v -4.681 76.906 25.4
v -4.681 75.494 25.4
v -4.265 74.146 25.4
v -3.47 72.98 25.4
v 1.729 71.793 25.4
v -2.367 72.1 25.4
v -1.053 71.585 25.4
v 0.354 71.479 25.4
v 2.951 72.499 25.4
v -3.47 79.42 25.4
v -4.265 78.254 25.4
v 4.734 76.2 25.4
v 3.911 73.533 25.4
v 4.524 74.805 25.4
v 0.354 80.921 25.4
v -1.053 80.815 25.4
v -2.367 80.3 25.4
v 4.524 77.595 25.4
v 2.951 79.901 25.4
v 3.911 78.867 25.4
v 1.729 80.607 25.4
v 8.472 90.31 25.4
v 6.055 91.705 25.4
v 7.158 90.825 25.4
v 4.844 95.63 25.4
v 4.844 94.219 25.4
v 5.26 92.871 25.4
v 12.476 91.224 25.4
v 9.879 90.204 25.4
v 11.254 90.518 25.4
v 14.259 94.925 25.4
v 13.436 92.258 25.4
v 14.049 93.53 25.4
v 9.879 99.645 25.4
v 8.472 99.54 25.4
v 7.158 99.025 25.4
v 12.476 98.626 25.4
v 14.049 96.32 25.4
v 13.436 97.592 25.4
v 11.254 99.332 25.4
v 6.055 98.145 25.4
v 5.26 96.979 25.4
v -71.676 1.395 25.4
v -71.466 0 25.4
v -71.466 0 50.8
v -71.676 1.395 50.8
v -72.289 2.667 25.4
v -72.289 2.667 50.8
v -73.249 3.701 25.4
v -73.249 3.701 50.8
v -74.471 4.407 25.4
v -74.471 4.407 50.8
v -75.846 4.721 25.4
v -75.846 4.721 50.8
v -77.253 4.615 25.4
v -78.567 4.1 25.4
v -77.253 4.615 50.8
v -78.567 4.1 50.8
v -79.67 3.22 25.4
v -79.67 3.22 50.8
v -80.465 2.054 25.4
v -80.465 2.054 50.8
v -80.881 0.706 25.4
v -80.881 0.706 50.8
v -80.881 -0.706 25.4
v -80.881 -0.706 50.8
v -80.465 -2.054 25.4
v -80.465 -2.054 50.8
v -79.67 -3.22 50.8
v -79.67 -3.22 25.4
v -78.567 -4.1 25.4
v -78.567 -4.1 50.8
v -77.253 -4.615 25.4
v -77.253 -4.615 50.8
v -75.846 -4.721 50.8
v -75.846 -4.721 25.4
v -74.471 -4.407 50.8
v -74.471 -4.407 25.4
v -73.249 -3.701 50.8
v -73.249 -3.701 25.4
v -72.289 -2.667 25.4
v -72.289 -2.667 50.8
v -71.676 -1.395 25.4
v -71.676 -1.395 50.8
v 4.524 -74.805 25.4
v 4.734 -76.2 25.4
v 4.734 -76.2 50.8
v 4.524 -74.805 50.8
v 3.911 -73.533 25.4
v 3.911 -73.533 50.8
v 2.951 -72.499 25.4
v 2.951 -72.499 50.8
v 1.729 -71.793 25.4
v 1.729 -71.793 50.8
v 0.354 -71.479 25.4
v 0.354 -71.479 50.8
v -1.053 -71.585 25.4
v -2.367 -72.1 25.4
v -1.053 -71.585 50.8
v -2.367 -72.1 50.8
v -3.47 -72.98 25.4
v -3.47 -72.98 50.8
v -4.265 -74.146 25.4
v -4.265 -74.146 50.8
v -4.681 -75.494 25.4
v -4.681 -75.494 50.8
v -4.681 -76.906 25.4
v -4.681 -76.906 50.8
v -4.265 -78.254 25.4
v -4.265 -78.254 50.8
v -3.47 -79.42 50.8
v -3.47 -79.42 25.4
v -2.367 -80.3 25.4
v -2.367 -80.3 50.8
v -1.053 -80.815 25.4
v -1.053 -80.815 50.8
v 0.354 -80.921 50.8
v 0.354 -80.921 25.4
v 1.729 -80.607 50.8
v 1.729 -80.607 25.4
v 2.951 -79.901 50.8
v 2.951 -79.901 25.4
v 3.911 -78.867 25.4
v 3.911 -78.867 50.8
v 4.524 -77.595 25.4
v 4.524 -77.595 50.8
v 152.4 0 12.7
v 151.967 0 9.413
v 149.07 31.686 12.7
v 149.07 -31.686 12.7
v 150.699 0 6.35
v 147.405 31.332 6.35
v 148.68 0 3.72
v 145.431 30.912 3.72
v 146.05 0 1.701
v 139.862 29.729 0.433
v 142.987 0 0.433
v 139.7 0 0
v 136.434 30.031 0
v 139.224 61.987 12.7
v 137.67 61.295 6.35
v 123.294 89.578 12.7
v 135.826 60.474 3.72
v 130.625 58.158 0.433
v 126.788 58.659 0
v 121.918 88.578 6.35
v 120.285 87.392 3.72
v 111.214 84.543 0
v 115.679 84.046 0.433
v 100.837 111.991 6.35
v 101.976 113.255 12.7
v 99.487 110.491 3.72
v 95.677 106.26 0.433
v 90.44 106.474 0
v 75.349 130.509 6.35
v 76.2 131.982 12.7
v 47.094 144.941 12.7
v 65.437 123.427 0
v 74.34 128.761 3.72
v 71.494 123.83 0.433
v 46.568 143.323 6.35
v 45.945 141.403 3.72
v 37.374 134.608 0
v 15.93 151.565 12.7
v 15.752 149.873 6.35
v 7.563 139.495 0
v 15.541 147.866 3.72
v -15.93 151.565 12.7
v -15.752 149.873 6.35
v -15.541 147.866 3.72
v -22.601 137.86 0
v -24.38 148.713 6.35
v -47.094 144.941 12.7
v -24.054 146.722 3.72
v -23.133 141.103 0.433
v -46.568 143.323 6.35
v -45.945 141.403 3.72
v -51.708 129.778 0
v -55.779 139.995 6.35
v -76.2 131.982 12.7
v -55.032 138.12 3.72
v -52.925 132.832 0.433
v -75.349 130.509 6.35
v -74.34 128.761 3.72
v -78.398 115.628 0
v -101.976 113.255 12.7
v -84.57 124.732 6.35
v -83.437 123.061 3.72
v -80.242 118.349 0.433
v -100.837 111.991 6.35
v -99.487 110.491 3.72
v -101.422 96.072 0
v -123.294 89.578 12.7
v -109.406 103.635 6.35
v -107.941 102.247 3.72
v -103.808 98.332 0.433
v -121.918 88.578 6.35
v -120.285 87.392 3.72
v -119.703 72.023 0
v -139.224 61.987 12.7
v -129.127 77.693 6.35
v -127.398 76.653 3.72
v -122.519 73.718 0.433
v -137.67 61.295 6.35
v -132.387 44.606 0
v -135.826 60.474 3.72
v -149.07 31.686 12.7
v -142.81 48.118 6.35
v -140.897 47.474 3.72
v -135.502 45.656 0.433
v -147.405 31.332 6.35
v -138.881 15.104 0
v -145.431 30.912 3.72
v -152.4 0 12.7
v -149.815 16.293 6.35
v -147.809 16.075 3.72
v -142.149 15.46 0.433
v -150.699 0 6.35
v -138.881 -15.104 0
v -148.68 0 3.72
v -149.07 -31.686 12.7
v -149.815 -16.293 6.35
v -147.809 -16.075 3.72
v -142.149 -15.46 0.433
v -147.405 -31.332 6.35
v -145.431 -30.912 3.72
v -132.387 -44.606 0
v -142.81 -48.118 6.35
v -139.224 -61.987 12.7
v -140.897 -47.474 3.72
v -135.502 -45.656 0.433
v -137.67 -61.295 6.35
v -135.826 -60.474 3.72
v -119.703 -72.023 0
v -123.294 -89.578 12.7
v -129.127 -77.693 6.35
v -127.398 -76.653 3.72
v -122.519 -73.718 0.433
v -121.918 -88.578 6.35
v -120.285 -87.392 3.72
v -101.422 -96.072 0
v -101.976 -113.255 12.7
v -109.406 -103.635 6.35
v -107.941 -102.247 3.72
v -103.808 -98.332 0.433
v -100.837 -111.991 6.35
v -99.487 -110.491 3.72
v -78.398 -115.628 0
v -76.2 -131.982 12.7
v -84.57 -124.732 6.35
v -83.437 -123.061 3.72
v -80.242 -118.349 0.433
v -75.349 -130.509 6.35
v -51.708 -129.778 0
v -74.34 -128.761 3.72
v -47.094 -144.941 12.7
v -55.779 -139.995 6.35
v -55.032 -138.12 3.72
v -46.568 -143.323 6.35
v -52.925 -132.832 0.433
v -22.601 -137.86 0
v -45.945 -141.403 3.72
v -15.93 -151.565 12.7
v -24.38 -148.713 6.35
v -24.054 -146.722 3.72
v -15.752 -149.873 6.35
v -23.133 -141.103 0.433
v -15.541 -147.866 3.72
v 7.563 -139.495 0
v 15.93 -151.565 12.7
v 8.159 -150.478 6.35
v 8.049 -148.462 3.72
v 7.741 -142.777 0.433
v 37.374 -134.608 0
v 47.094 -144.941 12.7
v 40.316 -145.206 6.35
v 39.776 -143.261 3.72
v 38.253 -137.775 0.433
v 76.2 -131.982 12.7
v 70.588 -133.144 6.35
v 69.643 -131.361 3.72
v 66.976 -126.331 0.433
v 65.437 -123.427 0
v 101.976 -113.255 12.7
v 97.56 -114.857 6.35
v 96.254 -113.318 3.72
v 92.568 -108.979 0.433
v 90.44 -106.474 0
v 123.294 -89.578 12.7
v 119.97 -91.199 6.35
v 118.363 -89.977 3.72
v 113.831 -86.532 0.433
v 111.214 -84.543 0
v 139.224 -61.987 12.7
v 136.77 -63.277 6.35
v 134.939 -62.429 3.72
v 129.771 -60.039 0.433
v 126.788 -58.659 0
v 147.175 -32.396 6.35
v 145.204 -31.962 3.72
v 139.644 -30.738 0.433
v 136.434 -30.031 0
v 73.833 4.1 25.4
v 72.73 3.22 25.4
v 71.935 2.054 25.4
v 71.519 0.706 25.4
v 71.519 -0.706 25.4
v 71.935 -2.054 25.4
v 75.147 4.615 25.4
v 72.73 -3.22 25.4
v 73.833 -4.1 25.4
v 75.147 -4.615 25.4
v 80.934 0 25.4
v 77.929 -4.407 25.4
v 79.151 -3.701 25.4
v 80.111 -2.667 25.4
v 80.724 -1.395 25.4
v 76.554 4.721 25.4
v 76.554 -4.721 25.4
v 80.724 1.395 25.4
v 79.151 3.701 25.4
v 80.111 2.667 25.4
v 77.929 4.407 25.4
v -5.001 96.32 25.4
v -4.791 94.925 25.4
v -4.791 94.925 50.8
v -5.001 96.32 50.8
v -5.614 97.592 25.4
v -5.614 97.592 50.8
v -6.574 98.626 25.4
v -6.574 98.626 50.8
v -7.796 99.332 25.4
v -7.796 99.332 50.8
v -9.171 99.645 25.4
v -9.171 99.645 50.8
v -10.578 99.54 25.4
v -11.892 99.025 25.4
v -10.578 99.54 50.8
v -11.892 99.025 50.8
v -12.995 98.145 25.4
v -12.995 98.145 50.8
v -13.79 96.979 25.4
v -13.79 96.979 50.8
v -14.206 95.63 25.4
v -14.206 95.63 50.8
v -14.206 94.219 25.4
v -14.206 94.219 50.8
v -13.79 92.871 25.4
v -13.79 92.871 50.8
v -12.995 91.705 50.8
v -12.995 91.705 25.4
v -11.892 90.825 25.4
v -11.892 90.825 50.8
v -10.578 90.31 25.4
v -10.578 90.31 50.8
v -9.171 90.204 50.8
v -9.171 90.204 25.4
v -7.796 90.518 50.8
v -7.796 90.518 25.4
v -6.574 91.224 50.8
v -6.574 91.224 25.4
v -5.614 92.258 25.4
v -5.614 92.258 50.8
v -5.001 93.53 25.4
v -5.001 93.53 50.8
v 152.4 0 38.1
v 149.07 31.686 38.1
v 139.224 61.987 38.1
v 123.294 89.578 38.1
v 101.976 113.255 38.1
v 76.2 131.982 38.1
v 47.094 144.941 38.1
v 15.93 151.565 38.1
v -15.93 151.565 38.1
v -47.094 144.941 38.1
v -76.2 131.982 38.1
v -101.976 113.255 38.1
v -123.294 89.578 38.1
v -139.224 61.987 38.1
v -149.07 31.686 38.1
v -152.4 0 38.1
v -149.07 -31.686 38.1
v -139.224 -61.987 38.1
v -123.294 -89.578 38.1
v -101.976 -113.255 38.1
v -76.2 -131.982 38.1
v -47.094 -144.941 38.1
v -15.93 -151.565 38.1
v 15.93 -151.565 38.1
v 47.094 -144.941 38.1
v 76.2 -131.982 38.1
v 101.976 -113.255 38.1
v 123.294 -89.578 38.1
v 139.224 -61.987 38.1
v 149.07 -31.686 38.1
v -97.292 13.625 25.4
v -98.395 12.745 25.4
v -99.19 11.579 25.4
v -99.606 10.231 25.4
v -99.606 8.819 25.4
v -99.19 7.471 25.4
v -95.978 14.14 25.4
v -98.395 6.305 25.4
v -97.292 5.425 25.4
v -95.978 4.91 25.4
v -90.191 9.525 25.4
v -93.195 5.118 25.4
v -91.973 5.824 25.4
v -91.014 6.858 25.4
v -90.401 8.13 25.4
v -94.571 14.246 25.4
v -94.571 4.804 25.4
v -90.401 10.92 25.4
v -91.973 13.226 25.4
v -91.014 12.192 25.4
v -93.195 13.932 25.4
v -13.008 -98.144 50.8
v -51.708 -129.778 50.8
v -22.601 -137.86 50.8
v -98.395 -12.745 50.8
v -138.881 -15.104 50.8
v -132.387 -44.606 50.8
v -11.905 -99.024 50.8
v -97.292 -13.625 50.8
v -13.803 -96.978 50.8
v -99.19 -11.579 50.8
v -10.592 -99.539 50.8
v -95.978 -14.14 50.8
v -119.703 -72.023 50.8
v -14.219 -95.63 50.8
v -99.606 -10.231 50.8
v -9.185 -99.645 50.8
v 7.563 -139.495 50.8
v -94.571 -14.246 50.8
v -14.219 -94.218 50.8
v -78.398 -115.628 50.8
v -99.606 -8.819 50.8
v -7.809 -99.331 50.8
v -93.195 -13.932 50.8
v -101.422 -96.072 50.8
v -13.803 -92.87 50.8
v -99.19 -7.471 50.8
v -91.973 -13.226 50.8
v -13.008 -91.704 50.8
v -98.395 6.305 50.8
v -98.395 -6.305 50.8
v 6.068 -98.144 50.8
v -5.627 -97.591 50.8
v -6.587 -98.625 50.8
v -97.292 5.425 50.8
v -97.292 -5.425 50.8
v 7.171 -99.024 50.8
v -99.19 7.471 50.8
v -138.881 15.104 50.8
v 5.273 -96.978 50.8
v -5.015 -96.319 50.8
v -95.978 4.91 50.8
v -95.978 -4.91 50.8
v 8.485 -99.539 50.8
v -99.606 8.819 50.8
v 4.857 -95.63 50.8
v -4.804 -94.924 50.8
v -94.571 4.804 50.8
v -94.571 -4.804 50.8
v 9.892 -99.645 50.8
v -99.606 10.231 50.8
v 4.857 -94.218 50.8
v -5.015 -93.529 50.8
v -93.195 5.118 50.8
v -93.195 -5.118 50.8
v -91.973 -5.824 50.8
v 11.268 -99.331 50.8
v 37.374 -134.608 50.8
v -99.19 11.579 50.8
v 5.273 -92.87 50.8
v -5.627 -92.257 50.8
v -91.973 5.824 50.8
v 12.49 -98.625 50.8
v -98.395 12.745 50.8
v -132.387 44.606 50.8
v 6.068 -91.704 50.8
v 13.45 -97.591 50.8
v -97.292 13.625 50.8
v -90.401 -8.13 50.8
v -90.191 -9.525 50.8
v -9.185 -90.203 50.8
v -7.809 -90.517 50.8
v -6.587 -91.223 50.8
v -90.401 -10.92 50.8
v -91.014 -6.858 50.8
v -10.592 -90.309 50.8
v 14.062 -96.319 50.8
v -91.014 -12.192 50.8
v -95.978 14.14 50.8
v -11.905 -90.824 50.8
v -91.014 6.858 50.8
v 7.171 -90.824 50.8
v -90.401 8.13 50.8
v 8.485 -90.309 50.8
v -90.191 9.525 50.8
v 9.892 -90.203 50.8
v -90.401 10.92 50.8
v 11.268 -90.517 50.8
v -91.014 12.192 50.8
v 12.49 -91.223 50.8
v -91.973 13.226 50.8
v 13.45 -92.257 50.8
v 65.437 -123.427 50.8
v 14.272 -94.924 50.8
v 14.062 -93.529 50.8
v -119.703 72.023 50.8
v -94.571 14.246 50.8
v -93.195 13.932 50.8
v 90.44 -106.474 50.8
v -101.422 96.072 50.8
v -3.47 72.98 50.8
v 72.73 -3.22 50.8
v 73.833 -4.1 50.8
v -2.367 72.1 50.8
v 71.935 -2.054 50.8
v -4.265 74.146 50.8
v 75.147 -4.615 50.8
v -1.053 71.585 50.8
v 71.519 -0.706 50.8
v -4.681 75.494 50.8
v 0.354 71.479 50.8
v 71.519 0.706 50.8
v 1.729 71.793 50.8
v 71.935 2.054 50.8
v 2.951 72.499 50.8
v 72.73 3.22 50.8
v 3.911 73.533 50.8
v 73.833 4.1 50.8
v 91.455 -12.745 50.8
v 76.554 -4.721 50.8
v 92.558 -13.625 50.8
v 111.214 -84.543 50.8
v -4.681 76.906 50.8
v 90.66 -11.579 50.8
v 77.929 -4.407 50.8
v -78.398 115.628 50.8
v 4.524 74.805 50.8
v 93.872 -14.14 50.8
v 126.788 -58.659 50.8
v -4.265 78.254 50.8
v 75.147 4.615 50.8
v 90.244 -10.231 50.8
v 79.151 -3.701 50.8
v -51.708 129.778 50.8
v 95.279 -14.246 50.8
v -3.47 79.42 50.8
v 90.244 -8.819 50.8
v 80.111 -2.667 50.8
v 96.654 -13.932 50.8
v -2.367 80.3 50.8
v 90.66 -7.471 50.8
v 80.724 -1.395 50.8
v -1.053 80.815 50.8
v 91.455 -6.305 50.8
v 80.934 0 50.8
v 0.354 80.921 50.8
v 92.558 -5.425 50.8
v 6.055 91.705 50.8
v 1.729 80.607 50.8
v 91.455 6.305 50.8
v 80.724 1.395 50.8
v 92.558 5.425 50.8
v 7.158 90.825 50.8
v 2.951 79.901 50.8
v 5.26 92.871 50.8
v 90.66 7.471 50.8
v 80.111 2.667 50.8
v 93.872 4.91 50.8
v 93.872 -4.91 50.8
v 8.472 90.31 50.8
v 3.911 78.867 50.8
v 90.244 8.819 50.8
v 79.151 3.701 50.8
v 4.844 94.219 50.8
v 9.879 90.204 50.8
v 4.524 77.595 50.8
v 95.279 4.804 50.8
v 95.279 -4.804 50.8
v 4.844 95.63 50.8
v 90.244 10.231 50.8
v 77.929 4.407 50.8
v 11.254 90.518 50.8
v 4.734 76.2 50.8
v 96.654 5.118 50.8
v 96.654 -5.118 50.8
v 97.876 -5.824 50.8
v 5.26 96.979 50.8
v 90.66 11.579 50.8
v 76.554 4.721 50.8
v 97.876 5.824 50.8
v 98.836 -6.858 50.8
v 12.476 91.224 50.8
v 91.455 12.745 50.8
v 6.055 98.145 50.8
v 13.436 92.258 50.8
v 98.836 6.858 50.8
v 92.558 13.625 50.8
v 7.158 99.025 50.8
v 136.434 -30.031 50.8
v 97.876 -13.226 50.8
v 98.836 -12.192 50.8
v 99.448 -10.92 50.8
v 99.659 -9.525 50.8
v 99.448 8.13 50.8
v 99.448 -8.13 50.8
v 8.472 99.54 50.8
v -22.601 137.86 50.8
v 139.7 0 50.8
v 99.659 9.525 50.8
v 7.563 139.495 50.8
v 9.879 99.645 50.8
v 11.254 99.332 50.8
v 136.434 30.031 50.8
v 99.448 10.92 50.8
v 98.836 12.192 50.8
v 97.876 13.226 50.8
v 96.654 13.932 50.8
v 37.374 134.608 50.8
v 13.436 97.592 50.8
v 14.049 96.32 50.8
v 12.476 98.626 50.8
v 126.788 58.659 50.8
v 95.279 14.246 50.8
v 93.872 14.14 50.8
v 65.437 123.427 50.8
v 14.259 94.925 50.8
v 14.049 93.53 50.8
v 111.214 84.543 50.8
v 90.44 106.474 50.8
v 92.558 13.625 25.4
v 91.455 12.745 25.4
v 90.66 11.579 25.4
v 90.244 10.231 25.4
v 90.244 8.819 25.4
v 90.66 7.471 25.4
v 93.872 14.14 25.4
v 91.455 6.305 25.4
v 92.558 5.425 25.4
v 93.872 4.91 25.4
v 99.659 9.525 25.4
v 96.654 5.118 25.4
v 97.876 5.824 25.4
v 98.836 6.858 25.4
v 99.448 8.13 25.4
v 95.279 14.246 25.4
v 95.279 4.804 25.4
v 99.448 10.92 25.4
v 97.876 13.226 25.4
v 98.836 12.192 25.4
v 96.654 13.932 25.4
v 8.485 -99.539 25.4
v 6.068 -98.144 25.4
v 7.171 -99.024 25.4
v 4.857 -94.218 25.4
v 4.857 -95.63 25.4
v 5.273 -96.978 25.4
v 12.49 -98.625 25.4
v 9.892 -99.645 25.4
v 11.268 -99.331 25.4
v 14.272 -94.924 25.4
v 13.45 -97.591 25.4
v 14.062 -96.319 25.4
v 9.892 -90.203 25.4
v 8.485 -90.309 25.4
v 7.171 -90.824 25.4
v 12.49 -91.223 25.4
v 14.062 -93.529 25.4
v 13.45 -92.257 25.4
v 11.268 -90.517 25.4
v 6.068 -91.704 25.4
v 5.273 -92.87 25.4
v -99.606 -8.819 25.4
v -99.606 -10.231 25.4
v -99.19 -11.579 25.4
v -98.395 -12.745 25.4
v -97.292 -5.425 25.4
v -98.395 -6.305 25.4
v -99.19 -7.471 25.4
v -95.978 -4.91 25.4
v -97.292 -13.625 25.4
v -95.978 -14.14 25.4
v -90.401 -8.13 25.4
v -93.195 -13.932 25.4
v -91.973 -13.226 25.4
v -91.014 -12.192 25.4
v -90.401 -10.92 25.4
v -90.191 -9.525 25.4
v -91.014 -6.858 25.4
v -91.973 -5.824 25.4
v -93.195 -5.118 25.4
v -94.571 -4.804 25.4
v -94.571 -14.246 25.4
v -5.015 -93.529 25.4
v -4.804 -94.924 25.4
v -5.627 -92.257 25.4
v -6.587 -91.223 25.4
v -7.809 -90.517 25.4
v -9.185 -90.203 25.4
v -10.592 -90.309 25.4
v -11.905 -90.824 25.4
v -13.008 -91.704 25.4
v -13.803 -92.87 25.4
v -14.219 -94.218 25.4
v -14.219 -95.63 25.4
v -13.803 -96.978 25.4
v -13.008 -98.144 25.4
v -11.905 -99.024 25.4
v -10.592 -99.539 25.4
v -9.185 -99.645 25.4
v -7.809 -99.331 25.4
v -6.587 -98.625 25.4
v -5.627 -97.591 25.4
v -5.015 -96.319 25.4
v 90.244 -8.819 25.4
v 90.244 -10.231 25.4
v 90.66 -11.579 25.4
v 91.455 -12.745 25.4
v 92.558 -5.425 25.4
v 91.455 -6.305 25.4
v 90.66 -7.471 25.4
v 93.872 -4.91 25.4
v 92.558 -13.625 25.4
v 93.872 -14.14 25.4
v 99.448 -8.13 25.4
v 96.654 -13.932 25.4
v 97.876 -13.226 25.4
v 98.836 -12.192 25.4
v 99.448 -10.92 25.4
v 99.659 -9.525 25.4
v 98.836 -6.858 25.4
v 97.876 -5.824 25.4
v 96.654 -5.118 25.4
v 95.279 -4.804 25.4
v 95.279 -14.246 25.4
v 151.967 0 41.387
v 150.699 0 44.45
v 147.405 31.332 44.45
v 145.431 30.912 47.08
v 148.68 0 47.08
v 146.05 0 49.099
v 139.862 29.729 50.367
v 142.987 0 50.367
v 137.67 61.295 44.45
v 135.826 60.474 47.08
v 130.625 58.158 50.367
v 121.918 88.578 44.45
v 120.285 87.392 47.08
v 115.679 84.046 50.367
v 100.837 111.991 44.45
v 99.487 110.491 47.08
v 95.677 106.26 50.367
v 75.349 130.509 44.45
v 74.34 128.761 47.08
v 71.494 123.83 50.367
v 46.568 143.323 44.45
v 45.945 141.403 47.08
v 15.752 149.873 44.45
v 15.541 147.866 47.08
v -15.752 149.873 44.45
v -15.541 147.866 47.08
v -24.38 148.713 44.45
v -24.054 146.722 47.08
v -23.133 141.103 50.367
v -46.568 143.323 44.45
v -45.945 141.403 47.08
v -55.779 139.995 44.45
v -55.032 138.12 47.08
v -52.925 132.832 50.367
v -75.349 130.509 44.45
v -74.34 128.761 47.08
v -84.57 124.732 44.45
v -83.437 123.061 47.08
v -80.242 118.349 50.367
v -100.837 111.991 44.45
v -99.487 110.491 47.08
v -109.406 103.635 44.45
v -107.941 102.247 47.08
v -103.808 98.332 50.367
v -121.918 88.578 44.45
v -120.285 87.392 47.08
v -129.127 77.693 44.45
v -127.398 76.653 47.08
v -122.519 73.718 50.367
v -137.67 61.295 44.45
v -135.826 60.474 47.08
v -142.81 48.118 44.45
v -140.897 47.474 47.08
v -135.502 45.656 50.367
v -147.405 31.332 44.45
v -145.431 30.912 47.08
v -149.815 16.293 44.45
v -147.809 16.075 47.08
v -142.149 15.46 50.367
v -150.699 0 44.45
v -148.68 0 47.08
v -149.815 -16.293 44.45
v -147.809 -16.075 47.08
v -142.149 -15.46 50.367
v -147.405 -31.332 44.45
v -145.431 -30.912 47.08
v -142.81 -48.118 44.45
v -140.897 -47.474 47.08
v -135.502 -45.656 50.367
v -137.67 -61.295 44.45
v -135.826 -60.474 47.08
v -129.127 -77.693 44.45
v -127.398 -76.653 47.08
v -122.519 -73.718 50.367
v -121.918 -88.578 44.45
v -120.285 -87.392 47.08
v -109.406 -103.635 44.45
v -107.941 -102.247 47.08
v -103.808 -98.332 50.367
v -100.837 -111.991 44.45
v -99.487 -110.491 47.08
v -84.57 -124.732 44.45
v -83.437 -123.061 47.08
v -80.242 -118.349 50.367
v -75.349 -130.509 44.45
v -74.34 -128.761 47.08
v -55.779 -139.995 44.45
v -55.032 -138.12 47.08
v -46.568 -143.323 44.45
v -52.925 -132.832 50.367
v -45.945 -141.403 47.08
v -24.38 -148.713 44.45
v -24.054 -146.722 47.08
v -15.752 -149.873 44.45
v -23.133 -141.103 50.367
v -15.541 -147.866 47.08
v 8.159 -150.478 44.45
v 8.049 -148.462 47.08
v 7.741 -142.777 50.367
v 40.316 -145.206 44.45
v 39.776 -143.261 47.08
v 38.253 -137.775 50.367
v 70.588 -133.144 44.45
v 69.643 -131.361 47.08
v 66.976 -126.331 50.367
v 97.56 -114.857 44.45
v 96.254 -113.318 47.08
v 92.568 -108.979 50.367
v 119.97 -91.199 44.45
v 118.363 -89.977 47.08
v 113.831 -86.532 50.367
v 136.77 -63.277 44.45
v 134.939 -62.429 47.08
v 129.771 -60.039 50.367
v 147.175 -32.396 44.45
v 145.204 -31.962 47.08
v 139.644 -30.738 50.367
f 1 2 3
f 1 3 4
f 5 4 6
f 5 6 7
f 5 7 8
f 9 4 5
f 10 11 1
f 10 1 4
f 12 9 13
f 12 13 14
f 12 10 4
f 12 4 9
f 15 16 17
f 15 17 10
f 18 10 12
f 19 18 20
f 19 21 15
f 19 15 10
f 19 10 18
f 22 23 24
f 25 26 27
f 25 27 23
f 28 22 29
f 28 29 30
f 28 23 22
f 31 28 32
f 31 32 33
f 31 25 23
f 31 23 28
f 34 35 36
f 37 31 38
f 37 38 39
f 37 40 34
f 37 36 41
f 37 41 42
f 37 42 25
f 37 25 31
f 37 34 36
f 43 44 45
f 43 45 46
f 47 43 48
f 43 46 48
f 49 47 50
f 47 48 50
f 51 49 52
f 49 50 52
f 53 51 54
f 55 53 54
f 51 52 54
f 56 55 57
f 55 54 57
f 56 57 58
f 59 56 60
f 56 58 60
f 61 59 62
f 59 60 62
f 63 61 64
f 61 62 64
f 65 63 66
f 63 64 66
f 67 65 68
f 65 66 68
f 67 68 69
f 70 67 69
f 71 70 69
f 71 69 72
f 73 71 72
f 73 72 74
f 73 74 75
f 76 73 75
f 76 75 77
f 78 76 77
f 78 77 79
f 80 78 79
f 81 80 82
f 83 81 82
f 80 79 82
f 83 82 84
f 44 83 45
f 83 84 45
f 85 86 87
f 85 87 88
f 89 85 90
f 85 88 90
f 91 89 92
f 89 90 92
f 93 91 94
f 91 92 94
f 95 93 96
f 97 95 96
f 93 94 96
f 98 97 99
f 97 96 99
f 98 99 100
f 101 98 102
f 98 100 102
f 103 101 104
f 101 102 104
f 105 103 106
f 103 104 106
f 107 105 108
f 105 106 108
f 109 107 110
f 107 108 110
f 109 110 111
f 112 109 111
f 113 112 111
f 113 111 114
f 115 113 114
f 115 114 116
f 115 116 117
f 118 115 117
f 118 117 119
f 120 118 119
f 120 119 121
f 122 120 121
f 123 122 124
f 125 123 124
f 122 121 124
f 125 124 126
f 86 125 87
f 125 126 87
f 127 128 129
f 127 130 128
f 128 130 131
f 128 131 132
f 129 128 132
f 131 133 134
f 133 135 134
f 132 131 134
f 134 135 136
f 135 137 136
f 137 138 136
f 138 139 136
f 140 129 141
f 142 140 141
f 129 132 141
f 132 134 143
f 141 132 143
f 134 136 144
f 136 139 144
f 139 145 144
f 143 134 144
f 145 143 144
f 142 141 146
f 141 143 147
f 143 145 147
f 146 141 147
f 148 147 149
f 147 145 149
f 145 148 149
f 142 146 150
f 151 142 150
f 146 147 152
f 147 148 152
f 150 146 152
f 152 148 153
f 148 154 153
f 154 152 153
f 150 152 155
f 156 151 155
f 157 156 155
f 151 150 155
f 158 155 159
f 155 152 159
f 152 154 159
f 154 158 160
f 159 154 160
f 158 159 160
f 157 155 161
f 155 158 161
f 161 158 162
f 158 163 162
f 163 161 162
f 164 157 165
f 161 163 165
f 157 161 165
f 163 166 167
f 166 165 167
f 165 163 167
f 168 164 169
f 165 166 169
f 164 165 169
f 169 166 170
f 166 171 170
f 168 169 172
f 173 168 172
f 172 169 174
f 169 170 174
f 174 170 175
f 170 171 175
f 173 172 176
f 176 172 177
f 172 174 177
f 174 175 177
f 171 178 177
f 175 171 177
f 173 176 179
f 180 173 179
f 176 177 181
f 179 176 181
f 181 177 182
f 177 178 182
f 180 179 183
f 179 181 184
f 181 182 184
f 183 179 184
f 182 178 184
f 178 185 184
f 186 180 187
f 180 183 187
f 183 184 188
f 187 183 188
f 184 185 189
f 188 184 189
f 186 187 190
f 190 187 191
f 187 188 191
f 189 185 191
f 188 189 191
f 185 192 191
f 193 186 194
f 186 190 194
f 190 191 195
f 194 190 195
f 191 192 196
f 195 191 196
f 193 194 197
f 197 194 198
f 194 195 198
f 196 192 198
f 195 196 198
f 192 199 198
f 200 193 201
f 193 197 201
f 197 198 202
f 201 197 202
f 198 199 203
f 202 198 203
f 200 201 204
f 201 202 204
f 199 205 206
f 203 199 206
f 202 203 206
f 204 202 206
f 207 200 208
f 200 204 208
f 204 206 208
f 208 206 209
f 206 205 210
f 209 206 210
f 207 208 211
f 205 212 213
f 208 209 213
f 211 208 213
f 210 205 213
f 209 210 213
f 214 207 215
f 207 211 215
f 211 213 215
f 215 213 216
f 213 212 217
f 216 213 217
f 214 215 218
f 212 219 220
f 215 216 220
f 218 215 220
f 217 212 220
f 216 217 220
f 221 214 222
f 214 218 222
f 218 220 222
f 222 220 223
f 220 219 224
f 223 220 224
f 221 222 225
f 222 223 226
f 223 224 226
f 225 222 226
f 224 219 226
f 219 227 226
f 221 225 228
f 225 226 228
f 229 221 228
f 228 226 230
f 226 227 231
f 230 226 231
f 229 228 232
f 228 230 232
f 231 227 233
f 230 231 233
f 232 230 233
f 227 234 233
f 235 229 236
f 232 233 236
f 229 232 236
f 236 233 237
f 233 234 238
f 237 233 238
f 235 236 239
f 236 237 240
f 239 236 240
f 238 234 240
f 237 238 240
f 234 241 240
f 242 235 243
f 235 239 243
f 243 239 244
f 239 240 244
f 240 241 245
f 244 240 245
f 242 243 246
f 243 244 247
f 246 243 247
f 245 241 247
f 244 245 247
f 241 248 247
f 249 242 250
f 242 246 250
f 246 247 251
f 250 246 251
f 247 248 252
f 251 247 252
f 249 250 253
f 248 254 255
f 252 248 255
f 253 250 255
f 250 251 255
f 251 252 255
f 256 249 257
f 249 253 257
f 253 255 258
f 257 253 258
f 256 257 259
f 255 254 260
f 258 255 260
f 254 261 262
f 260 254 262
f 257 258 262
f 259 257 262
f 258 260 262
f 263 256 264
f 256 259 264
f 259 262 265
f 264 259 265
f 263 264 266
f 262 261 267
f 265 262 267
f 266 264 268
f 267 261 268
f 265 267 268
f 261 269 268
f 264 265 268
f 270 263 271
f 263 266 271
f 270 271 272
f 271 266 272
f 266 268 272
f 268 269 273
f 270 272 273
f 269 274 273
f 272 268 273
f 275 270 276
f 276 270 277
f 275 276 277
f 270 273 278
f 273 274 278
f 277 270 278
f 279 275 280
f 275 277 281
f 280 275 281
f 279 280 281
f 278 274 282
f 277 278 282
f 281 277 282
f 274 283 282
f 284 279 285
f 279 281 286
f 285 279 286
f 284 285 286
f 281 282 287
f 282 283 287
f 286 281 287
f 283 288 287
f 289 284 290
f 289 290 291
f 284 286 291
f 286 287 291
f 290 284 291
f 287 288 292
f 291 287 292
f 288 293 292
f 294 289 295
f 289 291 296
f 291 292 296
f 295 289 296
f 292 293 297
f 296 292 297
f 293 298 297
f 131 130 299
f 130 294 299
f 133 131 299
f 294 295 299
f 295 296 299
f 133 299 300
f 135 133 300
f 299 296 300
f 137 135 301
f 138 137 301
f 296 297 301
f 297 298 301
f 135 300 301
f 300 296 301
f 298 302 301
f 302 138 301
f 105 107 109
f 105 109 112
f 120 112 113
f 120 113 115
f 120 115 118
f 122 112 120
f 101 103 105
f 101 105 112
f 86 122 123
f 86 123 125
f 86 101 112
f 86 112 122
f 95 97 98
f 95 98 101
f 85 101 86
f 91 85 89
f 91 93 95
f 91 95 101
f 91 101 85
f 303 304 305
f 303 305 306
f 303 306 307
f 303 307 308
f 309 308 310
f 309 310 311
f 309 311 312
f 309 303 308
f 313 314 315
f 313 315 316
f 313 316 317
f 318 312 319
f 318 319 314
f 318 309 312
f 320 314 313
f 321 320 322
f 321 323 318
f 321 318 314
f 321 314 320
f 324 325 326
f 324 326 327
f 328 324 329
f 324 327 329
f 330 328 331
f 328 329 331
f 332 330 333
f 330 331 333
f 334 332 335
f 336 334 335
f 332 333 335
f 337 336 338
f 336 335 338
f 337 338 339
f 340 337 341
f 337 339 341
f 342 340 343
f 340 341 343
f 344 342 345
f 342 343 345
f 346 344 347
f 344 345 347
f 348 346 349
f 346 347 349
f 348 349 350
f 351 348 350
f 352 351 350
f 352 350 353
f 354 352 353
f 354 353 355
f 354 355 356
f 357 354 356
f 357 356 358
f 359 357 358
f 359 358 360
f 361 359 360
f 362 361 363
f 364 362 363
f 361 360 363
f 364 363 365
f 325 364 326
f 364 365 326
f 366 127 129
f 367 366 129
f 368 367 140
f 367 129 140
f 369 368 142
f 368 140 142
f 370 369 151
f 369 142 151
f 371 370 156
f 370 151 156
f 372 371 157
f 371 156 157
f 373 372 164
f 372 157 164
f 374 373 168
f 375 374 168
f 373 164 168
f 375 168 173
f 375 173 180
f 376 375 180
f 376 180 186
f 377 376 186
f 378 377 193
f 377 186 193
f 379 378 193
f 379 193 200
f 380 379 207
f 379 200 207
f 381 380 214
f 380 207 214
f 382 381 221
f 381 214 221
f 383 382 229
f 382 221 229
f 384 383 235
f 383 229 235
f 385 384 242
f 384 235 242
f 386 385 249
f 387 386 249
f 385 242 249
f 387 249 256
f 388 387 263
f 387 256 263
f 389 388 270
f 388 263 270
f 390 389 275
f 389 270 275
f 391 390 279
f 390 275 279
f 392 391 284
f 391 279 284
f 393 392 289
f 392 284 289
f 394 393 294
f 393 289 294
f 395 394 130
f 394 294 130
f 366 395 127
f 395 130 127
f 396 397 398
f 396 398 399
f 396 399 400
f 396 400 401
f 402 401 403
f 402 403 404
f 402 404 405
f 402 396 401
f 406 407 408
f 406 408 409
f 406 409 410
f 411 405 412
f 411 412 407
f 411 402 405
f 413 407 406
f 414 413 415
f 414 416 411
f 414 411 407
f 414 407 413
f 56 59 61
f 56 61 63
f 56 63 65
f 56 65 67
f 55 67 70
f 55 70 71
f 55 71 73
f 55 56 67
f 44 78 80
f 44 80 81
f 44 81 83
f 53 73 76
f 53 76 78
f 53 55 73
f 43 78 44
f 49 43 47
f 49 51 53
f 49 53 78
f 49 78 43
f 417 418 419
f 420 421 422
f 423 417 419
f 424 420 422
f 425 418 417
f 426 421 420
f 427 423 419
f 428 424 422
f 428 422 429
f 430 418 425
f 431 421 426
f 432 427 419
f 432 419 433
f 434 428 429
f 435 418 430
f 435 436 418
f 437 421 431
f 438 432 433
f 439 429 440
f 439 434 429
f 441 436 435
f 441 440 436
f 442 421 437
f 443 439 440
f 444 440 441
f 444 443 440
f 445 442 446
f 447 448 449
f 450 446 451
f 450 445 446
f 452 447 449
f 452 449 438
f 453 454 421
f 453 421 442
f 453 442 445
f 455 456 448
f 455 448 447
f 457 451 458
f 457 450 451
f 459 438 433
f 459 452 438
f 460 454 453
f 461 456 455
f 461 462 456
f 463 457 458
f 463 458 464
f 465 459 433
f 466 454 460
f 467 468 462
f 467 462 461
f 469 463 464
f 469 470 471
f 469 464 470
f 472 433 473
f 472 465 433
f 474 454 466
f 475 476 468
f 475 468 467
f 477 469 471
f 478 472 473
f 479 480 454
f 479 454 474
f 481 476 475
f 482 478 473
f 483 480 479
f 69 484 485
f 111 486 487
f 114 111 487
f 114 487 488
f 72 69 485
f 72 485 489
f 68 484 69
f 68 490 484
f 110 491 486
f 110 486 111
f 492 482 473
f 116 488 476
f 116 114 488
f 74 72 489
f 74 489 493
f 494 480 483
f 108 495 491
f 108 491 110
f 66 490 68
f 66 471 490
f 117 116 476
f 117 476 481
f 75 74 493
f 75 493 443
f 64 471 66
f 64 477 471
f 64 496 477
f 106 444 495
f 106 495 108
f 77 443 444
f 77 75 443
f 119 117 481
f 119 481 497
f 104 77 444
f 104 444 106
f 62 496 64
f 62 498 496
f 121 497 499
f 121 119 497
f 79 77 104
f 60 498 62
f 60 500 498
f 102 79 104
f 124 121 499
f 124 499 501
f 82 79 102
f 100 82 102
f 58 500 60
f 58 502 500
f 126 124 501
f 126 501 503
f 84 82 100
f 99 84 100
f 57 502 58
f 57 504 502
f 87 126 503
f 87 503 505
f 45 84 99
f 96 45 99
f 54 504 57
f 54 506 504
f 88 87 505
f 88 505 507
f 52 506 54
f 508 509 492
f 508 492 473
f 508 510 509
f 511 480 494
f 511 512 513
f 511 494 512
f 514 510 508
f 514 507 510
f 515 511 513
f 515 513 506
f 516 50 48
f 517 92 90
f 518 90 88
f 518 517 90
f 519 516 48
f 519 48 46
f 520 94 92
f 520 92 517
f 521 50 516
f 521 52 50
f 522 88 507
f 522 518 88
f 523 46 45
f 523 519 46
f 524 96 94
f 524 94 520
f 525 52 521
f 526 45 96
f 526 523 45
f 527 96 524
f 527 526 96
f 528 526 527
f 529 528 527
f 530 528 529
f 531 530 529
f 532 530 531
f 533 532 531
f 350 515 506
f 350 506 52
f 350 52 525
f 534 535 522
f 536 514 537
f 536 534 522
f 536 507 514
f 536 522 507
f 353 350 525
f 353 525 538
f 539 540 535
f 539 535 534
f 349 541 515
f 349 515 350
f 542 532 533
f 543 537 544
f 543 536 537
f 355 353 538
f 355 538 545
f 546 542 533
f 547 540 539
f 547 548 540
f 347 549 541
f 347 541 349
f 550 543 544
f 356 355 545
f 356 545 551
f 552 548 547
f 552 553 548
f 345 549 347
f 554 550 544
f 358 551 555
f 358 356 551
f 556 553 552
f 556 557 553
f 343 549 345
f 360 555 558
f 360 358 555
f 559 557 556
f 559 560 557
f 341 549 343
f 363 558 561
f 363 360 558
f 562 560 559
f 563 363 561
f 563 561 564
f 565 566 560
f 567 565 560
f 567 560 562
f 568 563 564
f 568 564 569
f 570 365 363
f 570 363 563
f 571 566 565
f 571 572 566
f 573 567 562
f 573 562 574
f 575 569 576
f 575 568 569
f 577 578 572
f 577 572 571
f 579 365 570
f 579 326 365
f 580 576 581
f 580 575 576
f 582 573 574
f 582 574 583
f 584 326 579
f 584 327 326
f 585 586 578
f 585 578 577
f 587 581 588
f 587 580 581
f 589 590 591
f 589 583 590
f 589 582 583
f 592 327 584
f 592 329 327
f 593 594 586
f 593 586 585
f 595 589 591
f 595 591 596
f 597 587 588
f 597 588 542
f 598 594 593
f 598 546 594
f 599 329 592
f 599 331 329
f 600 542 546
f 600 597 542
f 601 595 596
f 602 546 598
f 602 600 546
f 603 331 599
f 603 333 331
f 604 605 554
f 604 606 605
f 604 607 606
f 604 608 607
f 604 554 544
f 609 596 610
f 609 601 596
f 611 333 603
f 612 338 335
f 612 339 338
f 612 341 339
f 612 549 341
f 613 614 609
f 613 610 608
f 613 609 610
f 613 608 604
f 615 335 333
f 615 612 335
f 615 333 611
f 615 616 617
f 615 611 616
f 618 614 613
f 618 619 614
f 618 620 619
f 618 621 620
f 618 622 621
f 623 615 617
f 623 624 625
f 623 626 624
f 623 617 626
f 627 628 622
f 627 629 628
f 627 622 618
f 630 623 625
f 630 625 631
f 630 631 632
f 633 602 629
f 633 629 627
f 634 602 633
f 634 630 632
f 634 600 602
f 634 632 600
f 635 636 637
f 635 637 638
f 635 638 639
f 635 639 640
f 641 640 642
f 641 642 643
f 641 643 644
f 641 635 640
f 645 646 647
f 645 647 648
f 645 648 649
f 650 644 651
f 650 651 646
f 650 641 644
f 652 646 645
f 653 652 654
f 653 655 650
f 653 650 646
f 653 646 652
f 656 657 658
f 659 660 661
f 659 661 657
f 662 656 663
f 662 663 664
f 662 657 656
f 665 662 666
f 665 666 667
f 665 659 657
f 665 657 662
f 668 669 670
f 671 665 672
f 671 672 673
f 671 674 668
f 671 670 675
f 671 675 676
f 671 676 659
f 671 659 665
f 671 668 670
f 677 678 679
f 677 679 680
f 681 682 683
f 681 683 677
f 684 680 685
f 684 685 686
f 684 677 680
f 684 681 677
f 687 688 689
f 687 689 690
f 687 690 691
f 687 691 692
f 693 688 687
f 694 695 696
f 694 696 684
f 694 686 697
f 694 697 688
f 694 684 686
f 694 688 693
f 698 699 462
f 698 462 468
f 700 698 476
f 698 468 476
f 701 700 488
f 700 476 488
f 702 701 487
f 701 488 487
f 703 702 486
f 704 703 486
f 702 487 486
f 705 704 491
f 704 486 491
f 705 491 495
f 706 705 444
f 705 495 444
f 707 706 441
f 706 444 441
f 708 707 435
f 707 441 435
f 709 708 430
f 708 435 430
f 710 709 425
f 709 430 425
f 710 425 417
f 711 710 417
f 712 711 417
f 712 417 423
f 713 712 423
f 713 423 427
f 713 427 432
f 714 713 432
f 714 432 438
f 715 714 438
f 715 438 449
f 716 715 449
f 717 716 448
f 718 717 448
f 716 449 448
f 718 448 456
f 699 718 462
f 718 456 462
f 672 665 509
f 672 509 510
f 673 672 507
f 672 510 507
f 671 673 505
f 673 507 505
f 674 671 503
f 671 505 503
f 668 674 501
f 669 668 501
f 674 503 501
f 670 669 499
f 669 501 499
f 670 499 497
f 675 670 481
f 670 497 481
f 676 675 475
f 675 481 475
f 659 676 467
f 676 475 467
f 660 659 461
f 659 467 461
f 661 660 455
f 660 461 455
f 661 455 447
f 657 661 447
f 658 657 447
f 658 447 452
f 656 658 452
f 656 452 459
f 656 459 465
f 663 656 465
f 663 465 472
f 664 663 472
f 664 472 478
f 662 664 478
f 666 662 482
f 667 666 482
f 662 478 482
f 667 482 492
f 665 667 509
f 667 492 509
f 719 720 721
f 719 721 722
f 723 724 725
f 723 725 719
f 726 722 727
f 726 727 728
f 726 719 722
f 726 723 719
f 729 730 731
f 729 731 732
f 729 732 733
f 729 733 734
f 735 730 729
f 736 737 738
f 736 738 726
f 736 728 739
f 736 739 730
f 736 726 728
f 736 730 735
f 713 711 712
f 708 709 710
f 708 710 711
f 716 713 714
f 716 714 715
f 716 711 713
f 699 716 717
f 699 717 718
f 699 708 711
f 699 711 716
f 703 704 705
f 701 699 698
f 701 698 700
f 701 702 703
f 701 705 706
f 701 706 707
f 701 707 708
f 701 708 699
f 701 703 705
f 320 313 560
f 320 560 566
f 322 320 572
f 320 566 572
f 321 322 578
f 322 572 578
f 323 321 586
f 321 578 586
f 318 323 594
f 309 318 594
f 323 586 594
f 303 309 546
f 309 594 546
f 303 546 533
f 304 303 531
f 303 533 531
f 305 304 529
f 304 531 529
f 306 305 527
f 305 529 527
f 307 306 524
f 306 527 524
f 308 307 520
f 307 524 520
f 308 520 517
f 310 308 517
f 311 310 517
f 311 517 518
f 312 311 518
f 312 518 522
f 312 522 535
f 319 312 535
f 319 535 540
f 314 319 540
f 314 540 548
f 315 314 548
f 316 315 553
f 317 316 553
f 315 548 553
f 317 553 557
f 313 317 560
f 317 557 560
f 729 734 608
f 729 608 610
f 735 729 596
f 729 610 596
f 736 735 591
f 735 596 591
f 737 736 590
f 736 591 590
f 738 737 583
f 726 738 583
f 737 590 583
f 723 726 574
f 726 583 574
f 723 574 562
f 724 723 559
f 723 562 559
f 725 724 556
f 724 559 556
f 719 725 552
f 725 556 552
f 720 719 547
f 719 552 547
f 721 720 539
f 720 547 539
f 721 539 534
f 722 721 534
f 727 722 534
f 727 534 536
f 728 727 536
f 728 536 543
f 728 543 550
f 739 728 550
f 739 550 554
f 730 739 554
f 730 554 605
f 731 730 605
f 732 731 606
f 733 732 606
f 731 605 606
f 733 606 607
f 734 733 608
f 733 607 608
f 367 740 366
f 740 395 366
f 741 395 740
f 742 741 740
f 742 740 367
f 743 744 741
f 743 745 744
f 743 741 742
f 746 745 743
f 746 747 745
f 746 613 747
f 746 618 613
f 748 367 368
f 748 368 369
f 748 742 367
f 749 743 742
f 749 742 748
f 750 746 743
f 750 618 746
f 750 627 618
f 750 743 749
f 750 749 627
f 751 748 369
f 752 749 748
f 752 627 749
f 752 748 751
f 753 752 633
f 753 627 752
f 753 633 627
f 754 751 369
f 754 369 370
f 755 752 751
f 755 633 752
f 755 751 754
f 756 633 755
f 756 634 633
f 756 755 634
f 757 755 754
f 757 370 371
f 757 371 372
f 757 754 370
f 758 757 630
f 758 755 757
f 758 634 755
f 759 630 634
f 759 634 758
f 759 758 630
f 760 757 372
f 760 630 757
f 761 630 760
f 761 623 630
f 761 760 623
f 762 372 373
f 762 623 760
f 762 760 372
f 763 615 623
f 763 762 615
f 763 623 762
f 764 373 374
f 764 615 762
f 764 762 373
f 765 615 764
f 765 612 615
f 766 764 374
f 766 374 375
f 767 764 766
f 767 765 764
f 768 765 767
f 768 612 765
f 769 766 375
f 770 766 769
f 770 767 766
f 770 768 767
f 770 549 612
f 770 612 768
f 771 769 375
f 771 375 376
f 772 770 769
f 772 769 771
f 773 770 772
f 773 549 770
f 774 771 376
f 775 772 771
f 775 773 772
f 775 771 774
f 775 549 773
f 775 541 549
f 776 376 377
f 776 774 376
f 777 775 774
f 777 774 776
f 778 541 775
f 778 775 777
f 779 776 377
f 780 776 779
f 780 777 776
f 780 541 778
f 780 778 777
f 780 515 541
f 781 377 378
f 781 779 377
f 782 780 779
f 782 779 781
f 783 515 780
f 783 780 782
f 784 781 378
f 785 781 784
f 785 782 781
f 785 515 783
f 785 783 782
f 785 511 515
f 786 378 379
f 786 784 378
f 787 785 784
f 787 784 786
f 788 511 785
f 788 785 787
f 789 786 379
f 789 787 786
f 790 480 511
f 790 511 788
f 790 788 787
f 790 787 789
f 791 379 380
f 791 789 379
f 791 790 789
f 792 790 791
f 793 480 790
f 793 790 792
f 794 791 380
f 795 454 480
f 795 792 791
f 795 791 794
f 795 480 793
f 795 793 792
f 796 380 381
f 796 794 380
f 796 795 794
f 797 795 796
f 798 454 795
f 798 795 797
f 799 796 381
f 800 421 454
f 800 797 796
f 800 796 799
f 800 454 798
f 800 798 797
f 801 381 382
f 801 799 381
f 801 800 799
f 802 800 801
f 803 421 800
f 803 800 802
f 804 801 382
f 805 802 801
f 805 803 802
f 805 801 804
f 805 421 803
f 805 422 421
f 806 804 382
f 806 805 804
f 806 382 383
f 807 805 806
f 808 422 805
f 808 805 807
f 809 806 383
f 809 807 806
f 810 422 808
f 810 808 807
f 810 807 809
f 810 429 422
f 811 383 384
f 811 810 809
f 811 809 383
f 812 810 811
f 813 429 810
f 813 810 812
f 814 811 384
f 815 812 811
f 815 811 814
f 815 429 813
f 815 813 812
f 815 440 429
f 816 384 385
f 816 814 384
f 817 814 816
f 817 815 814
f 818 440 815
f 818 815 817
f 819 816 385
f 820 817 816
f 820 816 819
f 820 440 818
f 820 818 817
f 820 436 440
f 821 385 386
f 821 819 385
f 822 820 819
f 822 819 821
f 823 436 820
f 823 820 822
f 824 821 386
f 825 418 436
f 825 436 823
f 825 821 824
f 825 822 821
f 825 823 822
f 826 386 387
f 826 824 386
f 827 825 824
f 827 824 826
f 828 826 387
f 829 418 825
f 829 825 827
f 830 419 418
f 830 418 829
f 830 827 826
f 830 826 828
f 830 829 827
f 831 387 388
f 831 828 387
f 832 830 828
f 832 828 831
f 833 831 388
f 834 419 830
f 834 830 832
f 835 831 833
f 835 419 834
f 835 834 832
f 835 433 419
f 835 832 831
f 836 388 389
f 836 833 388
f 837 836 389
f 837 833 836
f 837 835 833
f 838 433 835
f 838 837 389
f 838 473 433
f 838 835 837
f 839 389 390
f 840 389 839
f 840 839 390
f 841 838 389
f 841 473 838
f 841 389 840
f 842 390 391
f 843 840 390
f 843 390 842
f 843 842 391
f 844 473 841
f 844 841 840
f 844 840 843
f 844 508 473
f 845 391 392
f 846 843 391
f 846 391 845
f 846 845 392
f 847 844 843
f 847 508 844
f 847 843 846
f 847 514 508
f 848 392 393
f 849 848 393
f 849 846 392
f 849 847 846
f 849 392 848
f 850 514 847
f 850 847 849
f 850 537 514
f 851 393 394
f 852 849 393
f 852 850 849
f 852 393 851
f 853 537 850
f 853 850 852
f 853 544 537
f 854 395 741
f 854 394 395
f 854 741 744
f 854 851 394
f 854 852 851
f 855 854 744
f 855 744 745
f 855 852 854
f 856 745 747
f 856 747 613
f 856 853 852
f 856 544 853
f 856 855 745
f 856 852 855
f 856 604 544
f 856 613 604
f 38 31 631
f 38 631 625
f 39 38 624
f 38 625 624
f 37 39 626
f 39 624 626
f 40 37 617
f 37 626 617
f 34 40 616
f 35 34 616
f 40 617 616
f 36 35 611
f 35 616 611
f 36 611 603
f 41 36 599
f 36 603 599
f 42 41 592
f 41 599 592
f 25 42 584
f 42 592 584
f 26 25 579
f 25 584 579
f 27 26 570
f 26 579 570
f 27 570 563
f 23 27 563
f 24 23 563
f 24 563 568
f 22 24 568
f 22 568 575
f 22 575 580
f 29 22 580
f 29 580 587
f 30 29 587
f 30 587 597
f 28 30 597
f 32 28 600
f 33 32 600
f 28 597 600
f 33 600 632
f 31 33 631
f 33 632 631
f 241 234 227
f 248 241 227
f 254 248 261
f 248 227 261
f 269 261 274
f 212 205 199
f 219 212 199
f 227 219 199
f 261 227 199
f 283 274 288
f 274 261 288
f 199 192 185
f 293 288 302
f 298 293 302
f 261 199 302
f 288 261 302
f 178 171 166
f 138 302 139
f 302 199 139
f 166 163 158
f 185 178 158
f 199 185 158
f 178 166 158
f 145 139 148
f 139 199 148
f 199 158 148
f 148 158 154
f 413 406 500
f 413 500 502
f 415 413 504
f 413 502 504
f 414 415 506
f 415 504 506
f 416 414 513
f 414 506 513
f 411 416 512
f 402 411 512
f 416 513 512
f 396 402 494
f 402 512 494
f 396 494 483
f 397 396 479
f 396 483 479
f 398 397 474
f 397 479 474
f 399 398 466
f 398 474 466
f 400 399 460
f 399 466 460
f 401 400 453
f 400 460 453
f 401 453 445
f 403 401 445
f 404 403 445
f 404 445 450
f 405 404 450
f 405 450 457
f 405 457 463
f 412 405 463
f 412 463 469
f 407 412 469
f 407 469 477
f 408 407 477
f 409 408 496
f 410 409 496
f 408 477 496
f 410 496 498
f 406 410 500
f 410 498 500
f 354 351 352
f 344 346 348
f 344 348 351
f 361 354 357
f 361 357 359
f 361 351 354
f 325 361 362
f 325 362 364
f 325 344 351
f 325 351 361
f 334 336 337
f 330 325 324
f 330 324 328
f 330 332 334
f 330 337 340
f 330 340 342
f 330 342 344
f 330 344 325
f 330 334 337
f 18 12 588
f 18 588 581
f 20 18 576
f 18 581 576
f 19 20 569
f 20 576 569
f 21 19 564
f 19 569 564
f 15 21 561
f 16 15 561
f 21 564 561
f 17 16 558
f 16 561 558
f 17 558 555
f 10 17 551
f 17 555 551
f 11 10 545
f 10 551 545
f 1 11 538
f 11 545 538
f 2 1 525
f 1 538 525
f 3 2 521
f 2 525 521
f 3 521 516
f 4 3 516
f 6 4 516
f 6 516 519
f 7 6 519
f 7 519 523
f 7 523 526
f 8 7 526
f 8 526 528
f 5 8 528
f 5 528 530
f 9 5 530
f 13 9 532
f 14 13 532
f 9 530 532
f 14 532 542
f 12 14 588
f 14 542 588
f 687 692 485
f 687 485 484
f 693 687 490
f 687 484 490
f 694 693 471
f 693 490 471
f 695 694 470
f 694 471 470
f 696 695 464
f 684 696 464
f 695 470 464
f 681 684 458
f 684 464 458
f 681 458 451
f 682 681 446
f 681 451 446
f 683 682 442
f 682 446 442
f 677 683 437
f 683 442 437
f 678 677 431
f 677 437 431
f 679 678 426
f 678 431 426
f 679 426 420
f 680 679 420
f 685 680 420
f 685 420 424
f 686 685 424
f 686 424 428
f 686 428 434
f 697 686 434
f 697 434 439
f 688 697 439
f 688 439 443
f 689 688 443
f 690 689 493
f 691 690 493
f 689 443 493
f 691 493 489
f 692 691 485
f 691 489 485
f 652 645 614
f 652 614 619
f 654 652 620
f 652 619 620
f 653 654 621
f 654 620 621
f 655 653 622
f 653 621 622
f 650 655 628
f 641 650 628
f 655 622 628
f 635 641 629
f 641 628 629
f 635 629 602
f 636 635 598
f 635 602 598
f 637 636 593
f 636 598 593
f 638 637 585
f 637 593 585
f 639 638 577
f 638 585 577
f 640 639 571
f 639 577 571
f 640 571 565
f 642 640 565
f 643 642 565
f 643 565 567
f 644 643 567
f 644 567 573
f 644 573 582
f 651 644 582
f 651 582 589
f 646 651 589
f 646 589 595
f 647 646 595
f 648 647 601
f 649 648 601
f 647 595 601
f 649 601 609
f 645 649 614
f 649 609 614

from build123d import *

# Parameters (mm, degrees)
F0_R     = 152.4
F1_DEPTH = 50.8
F2_R     = 12.7
F3_R     = 4.733827
F4_DEPTH = 25.4


with BuildPart() as f1:
    # F0 (on Top) → F1 (new body)
    with BuildSketch(Plane.XY):
        Circle(F0_R)
    extrude(amount=F1_DEPTH)

    # F2
    f2_edges = [f1.edges().sort_by_distance(p)[0] for p in [
        (-152.4, 0, 50.8),
        (-152.4, 0, 0),
    ]]
    fillet(f2_edges, radius=F2_R)

    # F3 (on face) → F4 (cut)
    with BuildSketch(Plane.XY.offset(50.8)):
        with Locations((-94.924906, -9.525)):
            Circle(F3_R)
        with Locations((-94.924906, 9.525)):
            Circle(F3_R)
        with Locations((-76.2, 0)):
            Circle(F3_R)
        with Locations((-9.53826, -94.923999)):
            Circle(F3_R)
        with Locations((0, -76.2)):
            Circle(F3_R)
        with Locations((9.53826, -94.923999)):
            Circle(F3_R)
        with Locations((76.2, 0)):
            Circle(F3_R)
        with Locations((94.924906, 9.525)):
            Circle(F3_R)
        with Locations((94.924906, -9.525)):
            Circle(F3_R)
        with Locations((0, 76.2)):
            Circle(F3_R)
        with Locations((9.525, 94.924906)):
            Circle(F3_R)
        with Locations((-9.525, 94.924906)):
            Circle(F3_R)
    extrude(amount=-F4_DEPTH, mode=Mode.SUBTRACT)


solid = f1.part
